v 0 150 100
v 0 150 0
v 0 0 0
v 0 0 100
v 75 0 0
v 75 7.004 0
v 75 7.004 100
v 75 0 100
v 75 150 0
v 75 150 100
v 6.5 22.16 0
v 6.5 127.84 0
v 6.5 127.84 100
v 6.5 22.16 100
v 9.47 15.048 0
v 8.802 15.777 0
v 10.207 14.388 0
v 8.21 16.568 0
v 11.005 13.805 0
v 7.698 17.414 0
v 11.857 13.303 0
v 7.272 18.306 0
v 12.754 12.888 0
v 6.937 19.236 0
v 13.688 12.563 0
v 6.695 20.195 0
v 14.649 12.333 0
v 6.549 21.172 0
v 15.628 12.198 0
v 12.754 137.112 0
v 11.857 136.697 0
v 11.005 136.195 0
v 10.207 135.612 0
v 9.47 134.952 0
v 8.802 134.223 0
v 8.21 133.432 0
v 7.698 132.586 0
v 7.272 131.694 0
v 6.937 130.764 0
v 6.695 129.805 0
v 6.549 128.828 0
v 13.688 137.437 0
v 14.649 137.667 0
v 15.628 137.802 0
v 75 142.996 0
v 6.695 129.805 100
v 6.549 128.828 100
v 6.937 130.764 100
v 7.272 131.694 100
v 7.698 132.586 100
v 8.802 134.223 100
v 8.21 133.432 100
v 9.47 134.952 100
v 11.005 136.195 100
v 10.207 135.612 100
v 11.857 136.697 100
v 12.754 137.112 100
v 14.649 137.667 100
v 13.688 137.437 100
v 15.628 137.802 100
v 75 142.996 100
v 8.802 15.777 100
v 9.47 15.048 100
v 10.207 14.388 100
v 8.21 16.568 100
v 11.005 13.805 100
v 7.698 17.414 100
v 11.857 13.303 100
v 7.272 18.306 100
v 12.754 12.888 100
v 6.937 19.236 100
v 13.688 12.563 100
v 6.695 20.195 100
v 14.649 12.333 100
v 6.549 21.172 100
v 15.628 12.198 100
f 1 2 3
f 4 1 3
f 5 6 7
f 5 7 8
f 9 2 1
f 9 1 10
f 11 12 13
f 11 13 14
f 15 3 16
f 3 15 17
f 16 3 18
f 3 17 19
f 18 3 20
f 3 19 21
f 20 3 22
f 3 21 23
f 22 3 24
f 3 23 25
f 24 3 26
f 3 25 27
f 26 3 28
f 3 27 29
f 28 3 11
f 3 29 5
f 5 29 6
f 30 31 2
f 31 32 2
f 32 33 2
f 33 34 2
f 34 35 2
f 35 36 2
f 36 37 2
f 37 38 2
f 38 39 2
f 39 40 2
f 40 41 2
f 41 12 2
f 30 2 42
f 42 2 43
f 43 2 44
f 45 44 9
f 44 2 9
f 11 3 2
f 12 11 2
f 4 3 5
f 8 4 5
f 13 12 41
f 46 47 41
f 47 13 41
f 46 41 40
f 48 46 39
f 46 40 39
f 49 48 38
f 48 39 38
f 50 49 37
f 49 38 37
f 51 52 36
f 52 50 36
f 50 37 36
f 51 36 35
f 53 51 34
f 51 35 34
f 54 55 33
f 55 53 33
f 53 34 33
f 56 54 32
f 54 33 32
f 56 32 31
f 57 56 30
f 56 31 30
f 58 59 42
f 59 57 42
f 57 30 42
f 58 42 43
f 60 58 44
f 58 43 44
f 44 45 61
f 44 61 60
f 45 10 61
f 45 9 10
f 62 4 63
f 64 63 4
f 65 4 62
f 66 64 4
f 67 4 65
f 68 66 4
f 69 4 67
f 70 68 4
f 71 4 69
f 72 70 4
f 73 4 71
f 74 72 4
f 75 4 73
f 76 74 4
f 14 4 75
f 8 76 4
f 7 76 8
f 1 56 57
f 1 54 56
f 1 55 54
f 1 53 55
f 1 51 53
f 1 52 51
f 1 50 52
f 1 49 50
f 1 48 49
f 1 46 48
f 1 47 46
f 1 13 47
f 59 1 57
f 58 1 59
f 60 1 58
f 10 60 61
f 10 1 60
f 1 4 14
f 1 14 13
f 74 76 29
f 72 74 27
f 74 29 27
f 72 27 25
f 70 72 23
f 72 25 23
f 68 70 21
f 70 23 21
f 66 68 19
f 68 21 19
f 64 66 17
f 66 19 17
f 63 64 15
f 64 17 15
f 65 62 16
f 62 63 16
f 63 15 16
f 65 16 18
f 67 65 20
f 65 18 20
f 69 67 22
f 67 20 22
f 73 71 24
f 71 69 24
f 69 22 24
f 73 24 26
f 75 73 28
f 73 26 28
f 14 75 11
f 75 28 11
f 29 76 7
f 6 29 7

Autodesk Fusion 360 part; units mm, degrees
sketch "スケッチ1" plane through (0, 0, 0) normal (0, 0, 1) x (1, 0, 0)
  line L0 (6.5, 127.8402) -> (6.5, 22.1598)
  line L1 (0, 150) -> (0, 0)
  line L2 (0, 0) -> (75, 0)
  line L3 (15.6284, 12.1979) -> (75, 7.0035)
  arc A0 (6.5, 22.1598) -> (15.6284, 12.1979) centre (16.5, 22.1598) ccw
  line L4 (75, 7.0035) -> (75, 0)
  line L5 (75, 142.9965) -> (15.6284, 137.8021)
  line L6 (0, 150) -> (75, 150)
  arc A1 (15.6284, 137.8021) -> (6.5, 127.8402) centre (16.5, 127.8402) ccw
  line L7 (75, 150) -> (75, 142.9965)
extrude "押し出し1" add sketch "スケッチ1" along normal blind 100
